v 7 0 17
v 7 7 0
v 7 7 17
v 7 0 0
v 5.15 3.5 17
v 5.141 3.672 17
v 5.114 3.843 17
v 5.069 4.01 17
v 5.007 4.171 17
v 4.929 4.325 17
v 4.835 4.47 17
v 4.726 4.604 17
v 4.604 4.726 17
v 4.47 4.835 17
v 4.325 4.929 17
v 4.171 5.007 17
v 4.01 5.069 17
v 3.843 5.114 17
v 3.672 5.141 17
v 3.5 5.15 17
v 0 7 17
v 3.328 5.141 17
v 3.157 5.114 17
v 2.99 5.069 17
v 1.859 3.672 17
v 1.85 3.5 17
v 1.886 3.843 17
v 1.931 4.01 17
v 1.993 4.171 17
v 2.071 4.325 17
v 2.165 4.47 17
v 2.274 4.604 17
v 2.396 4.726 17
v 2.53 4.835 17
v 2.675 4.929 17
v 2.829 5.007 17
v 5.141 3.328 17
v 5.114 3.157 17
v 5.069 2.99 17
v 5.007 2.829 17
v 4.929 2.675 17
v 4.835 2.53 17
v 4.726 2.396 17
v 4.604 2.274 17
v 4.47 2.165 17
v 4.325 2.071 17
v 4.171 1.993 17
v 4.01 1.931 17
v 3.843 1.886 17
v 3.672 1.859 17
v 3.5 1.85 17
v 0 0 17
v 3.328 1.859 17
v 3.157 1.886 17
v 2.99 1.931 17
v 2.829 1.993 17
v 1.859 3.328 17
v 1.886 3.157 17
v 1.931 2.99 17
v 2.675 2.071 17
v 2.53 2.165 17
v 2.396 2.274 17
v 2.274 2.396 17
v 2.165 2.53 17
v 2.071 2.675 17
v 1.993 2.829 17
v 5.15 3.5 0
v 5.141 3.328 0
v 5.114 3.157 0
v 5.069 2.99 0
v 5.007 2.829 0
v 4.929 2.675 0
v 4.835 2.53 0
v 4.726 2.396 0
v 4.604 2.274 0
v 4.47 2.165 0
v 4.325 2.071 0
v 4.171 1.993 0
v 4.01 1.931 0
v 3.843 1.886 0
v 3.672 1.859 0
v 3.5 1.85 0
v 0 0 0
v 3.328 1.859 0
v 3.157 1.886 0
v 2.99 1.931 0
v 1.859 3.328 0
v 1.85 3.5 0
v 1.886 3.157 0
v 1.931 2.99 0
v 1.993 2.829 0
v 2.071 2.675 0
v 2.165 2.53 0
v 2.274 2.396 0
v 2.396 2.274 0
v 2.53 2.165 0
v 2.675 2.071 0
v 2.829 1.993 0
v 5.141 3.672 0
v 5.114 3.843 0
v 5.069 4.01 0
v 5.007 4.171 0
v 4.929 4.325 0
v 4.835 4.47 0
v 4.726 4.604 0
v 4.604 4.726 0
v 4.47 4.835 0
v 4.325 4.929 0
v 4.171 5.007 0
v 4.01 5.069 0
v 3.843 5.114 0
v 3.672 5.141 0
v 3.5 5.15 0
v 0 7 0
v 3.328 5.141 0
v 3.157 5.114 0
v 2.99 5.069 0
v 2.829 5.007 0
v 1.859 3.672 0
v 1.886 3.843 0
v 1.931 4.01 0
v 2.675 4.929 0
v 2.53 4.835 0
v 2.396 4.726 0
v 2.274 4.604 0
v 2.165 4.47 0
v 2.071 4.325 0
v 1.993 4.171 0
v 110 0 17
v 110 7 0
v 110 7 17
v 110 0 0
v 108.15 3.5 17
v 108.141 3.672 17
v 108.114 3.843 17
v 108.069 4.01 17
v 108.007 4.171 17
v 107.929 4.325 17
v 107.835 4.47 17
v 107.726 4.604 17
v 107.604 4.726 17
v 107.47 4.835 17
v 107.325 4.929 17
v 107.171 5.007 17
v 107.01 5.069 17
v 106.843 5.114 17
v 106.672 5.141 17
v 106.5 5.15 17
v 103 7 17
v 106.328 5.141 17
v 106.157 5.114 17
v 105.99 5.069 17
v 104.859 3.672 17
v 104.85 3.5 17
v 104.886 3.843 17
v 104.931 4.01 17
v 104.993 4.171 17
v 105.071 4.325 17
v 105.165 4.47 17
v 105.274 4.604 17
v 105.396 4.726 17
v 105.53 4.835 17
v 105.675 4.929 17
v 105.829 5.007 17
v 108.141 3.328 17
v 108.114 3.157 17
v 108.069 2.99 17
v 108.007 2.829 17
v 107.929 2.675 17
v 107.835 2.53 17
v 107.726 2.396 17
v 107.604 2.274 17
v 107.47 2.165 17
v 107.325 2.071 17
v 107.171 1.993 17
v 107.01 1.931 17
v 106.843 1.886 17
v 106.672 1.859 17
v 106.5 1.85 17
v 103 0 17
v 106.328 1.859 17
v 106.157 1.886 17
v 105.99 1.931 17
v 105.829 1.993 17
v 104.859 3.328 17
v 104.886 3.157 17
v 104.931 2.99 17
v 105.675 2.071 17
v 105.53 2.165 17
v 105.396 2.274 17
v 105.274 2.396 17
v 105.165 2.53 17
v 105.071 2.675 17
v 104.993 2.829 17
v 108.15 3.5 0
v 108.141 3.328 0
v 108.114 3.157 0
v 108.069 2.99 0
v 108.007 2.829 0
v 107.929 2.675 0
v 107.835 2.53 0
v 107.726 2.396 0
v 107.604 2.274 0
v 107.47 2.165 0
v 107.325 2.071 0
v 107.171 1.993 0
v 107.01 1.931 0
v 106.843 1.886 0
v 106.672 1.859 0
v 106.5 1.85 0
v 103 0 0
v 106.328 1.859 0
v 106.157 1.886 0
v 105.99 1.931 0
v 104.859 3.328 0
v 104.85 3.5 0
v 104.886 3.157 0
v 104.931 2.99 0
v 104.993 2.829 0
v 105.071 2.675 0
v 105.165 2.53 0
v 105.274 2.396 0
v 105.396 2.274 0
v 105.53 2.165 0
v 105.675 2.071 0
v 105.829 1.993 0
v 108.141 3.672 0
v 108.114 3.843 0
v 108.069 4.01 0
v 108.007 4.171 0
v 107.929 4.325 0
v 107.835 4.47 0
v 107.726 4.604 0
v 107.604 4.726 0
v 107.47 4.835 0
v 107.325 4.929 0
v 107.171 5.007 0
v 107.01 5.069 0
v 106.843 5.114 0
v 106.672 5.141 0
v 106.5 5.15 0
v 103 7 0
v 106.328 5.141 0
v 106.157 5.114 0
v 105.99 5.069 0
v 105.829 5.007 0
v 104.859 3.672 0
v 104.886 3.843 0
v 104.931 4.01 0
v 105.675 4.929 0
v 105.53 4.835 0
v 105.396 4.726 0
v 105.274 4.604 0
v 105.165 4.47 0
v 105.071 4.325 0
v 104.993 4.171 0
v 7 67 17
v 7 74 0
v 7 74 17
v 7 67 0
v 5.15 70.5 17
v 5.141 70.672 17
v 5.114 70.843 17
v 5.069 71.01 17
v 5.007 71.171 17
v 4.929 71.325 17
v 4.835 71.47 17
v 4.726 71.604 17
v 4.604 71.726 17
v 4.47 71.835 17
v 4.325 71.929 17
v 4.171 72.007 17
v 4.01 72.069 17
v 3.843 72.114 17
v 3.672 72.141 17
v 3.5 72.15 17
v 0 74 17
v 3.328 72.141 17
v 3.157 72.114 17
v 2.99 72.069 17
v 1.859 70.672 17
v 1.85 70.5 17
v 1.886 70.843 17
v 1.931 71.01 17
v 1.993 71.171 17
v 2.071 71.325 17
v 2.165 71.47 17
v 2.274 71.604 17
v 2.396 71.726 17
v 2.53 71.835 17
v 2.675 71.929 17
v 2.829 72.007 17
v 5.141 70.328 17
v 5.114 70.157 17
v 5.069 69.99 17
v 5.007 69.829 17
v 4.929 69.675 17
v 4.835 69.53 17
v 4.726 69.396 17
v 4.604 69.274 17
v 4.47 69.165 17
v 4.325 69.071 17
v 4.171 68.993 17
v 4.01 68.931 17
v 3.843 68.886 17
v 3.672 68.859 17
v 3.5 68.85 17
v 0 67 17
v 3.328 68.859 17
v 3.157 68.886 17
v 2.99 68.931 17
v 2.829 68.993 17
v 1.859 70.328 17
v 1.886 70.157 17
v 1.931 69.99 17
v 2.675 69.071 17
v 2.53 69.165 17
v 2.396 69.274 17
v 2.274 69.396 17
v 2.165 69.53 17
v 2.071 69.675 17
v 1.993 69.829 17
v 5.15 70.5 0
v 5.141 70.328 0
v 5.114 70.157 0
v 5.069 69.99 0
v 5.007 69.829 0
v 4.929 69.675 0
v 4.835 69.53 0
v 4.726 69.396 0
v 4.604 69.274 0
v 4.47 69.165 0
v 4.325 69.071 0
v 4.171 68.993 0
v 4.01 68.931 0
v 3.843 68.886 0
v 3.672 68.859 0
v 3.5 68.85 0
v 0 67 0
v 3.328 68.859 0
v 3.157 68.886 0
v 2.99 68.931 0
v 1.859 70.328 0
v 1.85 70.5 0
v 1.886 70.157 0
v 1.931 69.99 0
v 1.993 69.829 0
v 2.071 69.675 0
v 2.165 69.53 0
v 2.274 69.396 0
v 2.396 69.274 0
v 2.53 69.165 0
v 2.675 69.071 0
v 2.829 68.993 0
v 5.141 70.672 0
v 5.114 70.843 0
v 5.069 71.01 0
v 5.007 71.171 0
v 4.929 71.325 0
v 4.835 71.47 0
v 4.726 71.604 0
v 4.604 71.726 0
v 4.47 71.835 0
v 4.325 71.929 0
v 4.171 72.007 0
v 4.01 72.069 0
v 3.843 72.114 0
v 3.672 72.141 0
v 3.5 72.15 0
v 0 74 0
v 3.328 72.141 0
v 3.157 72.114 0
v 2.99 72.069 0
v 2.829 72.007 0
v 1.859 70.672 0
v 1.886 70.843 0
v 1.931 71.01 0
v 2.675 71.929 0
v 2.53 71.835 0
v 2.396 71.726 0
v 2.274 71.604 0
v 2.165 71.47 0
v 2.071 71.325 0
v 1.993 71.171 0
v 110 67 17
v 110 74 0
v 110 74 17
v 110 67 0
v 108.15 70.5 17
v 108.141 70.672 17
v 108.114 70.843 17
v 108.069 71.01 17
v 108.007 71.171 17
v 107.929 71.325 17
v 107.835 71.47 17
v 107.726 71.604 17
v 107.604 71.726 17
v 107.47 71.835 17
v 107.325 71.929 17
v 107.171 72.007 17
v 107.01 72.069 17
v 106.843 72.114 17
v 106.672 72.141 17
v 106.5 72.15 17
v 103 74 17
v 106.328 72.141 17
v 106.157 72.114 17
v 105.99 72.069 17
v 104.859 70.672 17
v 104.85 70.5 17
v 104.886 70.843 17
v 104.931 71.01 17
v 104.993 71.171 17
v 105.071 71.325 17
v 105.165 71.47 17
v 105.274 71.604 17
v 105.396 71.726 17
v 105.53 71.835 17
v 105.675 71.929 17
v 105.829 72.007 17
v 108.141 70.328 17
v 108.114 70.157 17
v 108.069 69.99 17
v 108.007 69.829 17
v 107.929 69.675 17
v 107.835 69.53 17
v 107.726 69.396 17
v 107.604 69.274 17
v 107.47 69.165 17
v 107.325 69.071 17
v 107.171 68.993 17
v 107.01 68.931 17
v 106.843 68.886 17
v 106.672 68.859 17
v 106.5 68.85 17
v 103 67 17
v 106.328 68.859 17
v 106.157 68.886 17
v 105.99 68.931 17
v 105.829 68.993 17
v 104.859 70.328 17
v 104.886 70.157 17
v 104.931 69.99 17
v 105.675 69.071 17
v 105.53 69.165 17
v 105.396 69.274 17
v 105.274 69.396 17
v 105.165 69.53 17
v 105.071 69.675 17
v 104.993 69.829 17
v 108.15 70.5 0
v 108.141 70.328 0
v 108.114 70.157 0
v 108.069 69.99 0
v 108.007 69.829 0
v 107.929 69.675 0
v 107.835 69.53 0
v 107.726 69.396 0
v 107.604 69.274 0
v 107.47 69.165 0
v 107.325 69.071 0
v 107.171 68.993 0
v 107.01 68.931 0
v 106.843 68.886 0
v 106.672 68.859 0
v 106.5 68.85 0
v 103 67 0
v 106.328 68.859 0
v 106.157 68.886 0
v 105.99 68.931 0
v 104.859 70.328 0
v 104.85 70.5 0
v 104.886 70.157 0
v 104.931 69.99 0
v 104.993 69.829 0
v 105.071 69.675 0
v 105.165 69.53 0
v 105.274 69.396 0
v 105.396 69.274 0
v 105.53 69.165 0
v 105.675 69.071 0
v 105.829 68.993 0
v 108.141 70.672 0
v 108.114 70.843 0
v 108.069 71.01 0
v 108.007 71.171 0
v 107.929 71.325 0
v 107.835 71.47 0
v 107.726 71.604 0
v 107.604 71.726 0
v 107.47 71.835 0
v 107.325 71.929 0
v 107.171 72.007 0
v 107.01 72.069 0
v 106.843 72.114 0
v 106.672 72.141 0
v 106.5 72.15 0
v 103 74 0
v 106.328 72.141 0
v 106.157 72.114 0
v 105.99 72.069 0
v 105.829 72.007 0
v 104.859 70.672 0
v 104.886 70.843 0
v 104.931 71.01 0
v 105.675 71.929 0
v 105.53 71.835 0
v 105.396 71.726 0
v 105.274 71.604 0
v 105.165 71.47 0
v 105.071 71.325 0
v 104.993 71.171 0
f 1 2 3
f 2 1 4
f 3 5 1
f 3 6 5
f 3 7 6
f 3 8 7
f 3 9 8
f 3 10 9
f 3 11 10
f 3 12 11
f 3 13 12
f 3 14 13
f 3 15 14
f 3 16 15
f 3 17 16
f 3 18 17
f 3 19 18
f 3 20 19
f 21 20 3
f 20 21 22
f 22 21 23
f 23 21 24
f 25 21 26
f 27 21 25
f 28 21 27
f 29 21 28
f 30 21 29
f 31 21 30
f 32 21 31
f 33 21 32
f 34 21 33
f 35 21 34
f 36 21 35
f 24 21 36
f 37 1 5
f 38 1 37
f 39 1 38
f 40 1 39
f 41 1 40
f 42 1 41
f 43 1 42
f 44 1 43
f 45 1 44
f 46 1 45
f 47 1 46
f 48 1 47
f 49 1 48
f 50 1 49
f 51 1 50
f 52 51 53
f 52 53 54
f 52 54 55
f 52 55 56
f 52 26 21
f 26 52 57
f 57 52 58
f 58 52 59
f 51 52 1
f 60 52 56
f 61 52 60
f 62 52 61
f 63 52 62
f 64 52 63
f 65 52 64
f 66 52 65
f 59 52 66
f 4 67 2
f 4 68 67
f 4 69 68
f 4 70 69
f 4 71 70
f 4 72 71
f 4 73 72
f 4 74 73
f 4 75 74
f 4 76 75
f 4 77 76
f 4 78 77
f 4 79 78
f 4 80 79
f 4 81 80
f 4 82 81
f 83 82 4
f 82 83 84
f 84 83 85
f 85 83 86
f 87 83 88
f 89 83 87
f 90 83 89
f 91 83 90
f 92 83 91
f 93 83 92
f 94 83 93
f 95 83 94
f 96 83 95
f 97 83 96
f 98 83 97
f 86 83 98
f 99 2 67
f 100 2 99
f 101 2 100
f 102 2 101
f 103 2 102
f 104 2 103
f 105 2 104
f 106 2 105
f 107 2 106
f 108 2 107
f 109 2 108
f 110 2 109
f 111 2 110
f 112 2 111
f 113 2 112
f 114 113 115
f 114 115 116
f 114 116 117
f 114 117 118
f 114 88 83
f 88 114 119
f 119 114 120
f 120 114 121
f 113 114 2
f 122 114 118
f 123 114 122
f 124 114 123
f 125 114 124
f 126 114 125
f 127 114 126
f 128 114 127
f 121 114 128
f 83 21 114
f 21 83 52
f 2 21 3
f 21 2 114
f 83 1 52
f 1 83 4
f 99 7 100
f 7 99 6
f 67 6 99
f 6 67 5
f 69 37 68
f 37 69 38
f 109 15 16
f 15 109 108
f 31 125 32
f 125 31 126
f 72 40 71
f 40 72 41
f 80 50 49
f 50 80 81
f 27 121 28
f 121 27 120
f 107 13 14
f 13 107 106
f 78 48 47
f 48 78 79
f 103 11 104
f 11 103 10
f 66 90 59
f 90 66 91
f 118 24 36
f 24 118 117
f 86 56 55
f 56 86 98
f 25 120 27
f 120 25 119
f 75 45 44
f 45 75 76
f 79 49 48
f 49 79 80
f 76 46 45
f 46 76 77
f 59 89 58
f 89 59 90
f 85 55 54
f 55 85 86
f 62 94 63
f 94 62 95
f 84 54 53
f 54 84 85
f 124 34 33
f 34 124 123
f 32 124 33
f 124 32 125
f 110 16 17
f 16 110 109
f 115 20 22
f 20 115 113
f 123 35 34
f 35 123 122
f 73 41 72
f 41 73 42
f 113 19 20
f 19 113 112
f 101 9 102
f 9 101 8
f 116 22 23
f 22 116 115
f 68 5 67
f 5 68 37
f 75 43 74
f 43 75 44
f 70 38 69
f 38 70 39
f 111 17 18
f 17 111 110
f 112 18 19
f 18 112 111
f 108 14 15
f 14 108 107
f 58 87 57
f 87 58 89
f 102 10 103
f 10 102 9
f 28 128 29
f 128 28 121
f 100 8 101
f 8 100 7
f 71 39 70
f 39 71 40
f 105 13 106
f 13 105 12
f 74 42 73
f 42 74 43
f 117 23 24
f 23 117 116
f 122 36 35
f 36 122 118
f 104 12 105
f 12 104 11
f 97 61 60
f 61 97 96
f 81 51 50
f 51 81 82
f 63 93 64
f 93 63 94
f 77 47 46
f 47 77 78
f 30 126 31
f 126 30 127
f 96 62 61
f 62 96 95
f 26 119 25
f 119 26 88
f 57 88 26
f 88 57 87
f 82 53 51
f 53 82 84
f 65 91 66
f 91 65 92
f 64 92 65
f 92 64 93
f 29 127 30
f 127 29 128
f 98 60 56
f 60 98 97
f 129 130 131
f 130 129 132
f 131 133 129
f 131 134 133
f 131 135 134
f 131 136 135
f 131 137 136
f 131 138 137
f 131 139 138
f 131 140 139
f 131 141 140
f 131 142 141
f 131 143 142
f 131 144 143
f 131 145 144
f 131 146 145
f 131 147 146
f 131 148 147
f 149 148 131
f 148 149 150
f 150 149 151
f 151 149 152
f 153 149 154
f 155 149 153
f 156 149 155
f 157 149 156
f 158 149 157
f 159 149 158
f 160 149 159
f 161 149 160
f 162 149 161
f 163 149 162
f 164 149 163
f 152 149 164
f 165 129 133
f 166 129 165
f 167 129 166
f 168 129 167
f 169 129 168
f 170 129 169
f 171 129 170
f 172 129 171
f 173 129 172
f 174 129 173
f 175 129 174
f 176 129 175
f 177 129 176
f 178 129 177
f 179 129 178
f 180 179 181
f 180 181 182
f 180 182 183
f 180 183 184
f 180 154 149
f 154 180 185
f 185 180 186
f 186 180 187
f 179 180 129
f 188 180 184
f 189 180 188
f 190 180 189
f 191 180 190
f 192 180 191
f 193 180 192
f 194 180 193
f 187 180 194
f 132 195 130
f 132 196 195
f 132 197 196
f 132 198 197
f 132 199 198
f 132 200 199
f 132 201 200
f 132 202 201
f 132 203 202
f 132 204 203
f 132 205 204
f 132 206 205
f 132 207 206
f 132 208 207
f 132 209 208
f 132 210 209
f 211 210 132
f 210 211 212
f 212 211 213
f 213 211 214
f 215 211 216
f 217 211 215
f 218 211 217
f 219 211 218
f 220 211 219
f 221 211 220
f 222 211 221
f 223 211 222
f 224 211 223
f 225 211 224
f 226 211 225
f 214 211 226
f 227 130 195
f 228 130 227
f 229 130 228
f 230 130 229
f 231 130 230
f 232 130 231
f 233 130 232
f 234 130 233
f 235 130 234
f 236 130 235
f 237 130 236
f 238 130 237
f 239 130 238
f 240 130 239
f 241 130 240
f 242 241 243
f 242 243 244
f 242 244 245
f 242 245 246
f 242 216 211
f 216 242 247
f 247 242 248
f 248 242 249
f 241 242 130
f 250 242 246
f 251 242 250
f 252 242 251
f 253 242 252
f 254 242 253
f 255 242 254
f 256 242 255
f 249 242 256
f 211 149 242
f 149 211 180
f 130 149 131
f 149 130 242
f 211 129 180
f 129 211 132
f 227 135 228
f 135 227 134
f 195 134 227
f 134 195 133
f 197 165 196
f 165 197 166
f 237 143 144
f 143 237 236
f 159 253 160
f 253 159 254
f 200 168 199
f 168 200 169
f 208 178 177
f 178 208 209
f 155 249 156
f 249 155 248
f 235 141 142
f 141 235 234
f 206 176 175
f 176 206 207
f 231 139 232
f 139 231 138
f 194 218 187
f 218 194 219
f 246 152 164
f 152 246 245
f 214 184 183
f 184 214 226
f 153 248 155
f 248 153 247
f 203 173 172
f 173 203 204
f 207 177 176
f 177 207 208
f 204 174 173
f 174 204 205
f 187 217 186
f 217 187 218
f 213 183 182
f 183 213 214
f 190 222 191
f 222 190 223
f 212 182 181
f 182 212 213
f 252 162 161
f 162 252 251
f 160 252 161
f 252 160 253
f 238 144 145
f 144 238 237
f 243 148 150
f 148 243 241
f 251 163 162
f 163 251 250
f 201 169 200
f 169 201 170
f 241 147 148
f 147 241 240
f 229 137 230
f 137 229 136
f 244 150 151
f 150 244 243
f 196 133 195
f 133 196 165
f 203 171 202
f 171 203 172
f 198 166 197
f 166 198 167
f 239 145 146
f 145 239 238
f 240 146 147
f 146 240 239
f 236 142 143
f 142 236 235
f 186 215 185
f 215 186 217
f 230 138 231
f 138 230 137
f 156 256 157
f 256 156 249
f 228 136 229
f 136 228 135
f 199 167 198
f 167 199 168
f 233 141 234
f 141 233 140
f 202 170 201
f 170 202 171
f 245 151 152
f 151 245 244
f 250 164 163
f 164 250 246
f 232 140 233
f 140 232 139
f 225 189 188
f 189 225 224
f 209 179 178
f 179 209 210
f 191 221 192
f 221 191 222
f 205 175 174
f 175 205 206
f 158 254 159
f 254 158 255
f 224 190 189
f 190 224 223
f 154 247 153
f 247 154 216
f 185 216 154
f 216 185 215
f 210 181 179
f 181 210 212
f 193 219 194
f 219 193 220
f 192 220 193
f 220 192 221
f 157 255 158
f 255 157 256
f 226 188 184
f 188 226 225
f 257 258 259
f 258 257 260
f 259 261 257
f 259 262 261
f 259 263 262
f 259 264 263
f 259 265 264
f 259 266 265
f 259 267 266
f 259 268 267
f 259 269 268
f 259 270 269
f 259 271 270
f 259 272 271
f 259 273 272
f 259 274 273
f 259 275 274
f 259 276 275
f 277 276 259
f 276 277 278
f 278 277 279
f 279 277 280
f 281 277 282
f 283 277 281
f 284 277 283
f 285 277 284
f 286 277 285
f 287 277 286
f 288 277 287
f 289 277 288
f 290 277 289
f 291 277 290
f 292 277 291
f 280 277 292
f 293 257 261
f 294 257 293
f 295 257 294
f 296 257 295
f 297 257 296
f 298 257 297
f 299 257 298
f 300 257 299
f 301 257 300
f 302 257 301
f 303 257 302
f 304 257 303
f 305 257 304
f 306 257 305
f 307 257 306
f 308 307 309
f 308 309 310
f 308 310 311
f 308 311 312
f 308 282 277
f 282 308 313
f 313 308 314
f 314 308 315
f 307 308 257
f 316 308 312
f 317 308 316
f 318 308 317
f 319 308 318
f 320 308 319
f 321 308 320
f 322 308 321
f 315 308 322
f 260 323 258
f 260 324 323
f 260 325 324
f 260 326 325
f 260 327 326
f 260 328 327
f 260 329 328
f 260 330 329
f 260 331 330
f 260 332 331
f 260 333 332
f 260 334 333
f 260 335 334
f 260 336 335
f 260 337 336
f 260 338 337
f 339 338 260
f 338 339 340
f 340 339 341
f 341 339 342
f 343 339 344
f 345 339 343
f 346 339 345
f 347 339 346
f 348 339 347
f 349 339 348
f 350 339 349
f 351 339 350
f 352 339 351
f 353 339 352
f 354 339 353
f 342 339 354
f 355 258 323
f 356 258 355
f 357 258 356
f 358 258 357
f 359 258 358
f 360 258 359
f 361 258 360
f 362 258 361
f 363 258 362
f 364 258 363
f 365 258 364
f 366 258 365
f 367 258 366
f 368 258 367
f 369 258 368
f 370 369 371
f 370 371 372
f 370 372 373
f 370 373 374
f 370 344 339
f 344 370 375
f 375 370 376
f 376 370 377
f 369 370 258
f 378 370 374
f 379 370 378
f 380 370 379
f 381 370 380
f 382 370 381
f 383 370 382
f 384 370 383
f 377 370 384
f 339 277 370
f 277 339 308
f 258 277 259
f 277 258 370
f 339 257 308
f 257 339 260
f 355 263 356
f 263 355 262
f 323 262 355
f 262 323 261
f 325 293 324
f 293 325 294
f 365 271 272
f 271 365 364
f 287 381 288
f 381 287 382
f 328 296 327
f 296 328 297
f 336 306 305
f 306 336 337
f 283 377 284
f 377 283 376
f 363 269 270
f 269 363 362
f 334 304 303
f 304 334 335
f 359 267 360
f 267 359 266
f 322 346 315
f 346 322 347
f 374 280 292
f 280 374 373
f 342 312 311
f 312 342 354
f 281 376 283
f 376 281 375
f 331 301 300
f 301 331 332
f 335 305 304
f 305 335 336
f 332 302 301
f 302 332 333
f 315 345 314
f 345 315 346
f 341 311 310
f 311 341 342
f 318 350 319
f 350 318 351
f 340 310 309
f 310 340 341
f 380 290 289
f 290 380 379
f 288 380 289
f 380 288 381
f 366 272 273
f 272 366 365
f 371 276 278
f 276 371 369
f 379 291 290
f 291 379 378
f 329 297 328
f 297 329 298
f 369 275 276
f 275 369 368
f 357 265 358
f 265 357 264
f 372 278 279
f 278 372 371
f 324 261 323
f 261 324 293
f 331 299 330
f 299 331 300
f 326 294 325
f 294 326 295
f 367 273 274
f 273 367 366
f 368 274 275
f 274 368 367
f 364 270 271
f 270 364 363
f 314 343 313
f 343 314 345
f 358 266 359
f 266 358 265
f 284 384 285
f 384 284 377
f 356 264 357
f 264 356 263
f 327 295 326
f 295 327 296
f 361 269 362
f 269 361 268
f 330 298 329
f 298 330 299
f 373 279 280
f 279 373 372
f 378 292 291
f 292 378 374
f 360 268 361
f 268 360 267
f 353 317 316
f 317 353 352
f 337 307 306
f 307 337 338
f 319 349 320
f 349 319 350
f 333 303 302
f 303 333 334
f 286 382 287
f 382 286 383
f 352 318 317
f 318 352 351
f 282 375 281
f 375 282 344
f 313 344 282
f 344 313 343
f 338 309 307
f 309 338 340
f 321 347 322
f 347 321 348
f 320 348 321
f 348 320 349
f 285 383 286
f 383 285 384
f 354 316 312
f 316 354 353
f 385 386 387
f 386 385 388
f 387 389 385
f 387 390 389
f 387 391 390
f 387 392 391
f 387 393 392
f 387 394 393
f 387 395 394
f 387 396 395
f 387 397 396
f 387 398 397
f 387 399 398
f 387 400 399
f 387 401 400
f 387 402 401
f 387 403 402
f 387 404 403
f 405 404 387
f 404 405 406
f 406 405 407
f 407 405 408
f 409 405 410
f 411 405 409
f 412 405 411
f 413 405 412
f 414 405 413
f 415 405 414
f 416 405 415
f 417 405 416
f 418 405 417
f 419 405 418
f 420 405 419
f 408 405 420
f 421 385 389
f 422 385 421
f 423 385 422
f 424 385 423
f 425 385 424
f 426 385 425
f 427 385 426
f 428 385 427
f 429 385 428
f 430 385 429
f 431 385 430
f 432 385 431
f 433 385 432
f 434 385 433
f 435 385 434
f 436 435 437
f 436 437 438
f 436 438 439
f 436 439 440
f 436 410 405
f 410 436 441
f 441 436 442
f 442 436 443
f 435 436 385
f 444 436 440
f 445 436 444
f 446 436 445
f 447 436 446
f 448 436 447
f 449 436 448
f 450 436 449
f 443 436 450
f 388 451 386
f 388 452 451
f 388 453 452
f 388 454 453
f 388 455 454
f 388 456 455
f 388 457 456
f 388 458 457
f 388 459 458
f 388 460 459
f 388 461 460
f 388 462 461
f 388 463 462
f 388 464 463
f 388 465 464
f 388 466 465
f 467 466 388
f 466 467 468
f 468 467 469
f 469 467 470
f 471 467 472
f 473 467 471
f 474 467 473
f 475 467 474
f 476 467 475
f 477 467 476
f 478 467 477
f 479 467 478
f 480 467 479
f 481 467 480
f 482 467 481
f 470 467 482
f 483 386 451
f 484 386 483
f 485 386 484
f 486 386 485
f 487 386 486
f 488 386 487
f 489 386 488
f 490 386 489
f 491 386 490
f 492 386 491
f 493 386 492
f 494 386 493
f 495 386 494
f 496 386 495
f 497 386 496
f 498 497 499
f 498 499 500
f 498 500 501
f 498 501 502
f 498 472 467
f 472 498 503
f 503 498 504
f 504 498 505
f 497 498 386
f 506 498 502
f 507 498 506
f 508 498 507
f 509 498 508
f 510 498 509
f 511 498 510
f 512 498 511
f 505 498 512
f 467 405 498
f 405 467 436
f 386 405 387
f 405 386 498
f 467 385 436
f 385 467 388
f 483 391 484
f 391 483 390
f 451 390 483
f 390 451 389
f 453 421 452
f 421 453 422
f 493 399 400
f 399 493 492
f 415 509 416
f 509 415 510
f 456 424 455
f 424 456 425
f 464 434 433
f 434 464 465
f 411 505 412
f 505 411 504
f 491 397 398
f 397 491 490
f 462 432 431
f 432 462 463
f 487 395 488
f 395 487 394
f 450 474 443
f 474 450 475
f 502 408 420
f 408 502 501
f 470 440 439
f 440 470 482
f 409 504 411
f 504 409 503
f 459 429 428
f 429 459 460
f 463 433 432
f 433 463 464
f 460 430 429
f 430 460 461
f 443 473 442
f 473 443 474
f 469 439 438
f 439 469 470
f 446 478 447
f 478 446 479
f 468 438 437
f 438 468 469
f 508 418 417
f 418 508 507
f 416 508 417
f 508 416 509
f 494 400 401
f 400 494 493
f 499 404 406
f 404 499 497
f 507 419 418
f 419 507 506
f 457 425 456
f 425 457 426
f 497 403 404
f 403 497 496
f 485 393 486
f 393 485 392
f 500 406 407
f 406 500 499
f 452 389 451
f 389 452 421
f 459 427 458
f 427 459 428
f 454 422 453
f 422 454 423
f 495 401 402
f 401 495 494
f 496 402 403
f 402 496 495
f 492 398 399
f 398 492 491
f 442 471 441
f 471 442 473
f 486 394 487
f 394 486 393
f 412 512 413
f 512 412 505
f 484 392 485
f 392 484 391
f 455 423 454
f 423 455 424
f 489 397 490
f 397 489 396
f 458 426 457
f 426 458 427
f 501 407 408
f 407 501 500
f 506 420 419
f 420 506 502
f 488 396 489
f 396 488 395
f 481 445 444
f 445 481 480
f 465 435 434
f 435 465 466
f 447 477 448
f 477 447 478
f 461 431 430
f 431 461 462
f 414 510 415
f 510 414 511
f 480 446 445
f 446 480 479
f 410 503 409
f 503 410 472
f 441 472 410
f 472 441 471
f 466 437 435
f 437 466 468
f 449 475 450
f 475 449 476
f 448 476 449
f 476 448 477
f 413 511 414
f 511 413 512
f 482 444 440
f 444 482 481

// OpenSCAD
// file: ../../00_common/screw_bosses.scad
// =============================================================================
// OpenMotorBridge - Screw Bosses & Fastener Primitives
// =============================================================================
// File: hardware/cad/scad/00_common/screw_bosses.scad
// Description: Reusable parametric modules for screw standoffs, corner clamping
//              posts, and mounting ears.
// =============================================================================

include <parameters.scad>;

// 1. Cylindrical Screw Standoff Boss (with center hole)
module screw_boss(outer_r=2.5, inner_r=1.2, h=5.0) {
    difference() {
        cylinder(r=outer_r, h=h, center=false);
        translate([0, 0, -0.1])
            cylinder(r=inner_r, h=h + 0.2, center=false);
    }
}

// 2. Rectangular Corner Clamping Post (with center screw hole)
module corner_screw_post(size_x=5.0, size_y=5.0, h=12.0, hole_r=1.65, hole_h=10.0, hole_offset_z=2.0) {
    difference() {
        cube(size=[size_x, size_y, h], center=false);
        translate([size_x/2.0, size_y/2.0, hole_offset_z])
            cylinder(r=hole_r, h=hole_h + 0.1, center=false);
    }
}

// 3. M4 Silentblock Outer Mounting Ear (Centered in Y around y=0, extends along +X)
module mounting_ear_m4(ear_len=14.0, ear_w=12.0, ear_h=5.0, hole_r=2.2) {
    difference() {
        union() {
            translate([0, -ear_w/2.0, 0])
                cube(size=[ear_len - ear_w/2.0, ear_w, ear_h], center=false);
            translate([ear_len - ear_w/2.0, 0, 0])
                cylinder(r=ear_w/2.0, h=ear_h, center=false);
        }
        translate([ear_len - ear_w/2.0, 0, -0.1])
            cylinder(r=hole_r, h=ear_h + 0.2, center=false);
    }
}

// 4. Captive Hex Nut Pocket (DIN 934 / DIN 985 with center screw through-hole)
module hex_nut_pocket(sw=NUT_M4_SW, h=NUT_M4_H, screw_r=M4_SCREW_HOLE_R, through_h=10.0) {
    // Hexagonal pocket (flat-to-flat SW converted to circle radius: r = sw / sqrt(3))
    hex_r = sw / sqrt(3);
    union() {
        // Hexagonal nut pocket
        cylinder(r=hex_r, h=h, center=false, $fn=6);
        // Screw clearance through-hole
        translate([0, 0, -through_h/2.0])
            cylinder(r=screw_r, h=through_h + h, center=false, $fn=30);
    }
}
// file: ../../00_common/parameters.scad
// =============================================================================
// OpenMotorBridge - Global CAD Parameters & Settings
// =============================================================================
// File: hardware/cad/scad/00_common/parameters.scad
// Description: Global dimensional constants, manufacturing clearances and
//              circle resolution ($fn) for all OpenSCAD modules.
// =============================================================================

// --- 1. Circle & Curve Resolution ---
$fn = 60; // Smooth cylinders and holes for high-quality MJF 3D printing

// --- 2. Central Main Box Dimensions (3-Tier Sandwich) ---
MAIN_BOX_OUTER_L      = 110.0; // Outer length in X (mm)
MAIN_BOX_OUTER_W      = 74.0;  // Outer width in Y (mm)
MAIN_BOX_LOWER_H      = 17.0;  // Lower case height in Z (mm)
MAIN_BOX_MID_H        = 15.0;  // Mid tray height in Z (mm)
MAIN_BOX_LID_H        = 4.0;   // Lid plate thickness in Z (mm)
MAIN_BOX_WALL         = 2.5;   // Nominal wall thickness (mm)
MAIN_BOX_CORNER_POST  = 7.0;   // Corner clamping screw post size (mm, for M3 hex nut pockets)

// --- 3. Satellite Pod Dimensions (Universal Enlarged Envelope) ---

POD_OUTER_W           = 70.0;  // Outer width in Y (mm)
POD_OUTER_H           = 38.0;  // Outer height in Z (mm)
POD_WALL              = 3.5;   // Nominal wall thickness (mm)
POD_BULKHEAD_X        = 18.0;  // Partition bulkhead position in X (mm)
POD_CHAMBER_L         = 117.0; // Sliding chamber length in X (mm)
POD_CHAMBER_W         = 63.0;  // Sliding chamber width in Y (mm)
POD_CHAMBER_H         = 31.0;  // Sliding chamber height in Z (mm)

// --- 4. Pod Linear Guide Rails (Poka-Yoke Tongue & Groove) ---
POD_GROOVE_W          = 3.0;   // Internal guide groove width in Z (mm)
POD_GROOVE_DEPTH      = 1.5;   // Internal guide groove depth in Y (mm)
POD_GROOVE_LEFT_Z     = 10.0;  // Center height of left groove (mm)
POD_GROOVE_RIGHT_Z    = 18.0;  // Center height of right groove (mm, asym offset)

CARTRIDGE_TONGUE_W    = 2.6;   // Cartridge tongue rail height in Z (mm, 0.2mm clearance)
CARTRIDGE_TONGUE_PROT = 1.4;   // Cartridge tongue protrusion in Y (mm, 0.1mm clearance)
CARTRIDGE_CHAMFER_L   = 4.0;   // 30° lead-in chamfer nose length (mm)

// --- 5. Cartridge Dimensions (Enlarged Universal Sled) ---
CARTRIDGE_BASE_L      = 116.0; // Sled length in X (mm)
CARTRIDGE_BASE_W      = 58.0;  // Sled width in Y (mm)
CARTRIDGE_BASE_H      = 28.0;  // Sled height in Z (mm)
CARTRIDGE_FACE_L      = 4.0;   // Front faceplate thickness in X (mm)
CARTRIDGE_FACE_W      = 64.0;  // Front faceplate width in Y (mm)
CARTRIDGE_FACE_H      = 34.0;  // Front faceplate height in Z (mm)

// --- 5a. RF Interface & Sealing Dimensions ---
SMA_BORE_R            = 3.25;  // Ø 6.5 mm through-hole for standard SMA bulkhead
SMA_ORECESS_R         = 4.75;  // Ø 9.5 mm recess for waterproof silicone O-ring
SMA_ORECESS_DEPTH     = 1.2;   // 1.2 mm deep O-ring compression pocket

// --- 5b. Magnetic Anti-Theft Lock System ---
LATCH_PIVOT_X         = 58.0;  // Center pivot position along sled X (mm)
LATCH_MAGNET_X        = 46.0;  // Ferromagnetic anchor position along sled X (mm)
LATCH_TOOTH_X         = 70.0;  // Locking sawtooth pawl position along sled X (mm)
LATCH_ARM_H           = 6.0;   // Rocker lever height in Z (mm)
LATCH_ARM_THICK       = 2.6;   // Rocker beam thickness in Y (mm)
LATCH_MAGNET_PIN_DIA  = 6.2;   // Bore for Ø 6.0 mm steel dowel pin (mm)
LATCH_SPRING_DIA      = 3.8;   // Bore for Ø 3.5 mm return compression spring (mm)

// --- 6. Standard Captive Hex Nut Pockets (DIN 934 / DIN 985 with +0.2 mm MJF/FDM clearance) ---
NUT_M2_SW             = 4.2;   // M2 across flats (nominal 4.0 mm)
NUT_M2_H              = 1.8;   // M2 thickness (nominal 1.6 mm)
NUT_M2_5_SW           = 5.2;   // M2.5 across flats (nominal 5.0 mm)
NUT_M2_5_H            = 2.2;   // M2.5 thickness (nominal 2.0 mm)
NUT_M3_SW             = 5.7;   // M3 across flats (nominal 5.5 mm)
NUT_M3_H              = 2.6;   // M3 thickness (nominal 2.4 mm)
NUT_M4_SW             = 7.2;   // M4 across flats (nominal 7.0 mm)
NUT_M4_H              = 3.4;   // M4 thickness (nominal 3.2 mm)
NUT_M5_SW             = 8.2;   // M5 across flats (nominal 8.0 mm)
NUT_M5_H              = 4.2;   // M5 thickness (nominal 4.0 mm)

// Direct Plastic Thread-Forming / Self-Tapping Pilot Holes in PA12 (100% Soldering-Iron Free)
M2_PILOT_HOLE_R       = 0.85;  // Core hole for M2 screws in PA12 (Ø 1.7 mm)
M2_5_PILOT_HOLE_R     = 1.05;  // Core hole for M2.5 screws in PA12 (Ø 2.1 mm)
M3_PILOT_HOLE_R       = 1.25;  // Core hole for M3 screws in PA12 (Ø 2.5 mm)

// --- 7. Screw & Clearance Dimensions ---
M2_SCREW_HOLE_R       = 1.1;   // M2 clearance hole (r = 1.1 mm -> Ø 2.2 mm)
M2_5_SCREW_HOLE_R     = 1.4;   // M2.5 clearance hole (r = 1.4 mm -> Ø 2.8 mm)
M3_SCREW_HOLE_R       = 1.65;  // M3 clearance hole (r = 1.65 mm -> Ø 3.3 mm)
M4_SCREW_HOLE_R       = 2.2;   // M4 clearance hole (r = 2.2 mm -> Ø 4.4 mm)
M8_BORE_R             = 4.0;   // M8 cable through-bore (r = 4.0 mm -> Ø 8.0 mm)
M8_STUDS_OUTER_R      = 6.0;   // M8 neck outer radius (Ø 12.0 mm)

// --- 8. Universal Front Node Enclosure Dimensions (Type E: 98 x 68 x 25 mm) ---
FRONT_NODE_PCB_L      = 82.0;  // PCB length in X (mm, PCBA 05)
FRONT_NODE_PCB_W      = 50.0;  // PCB width in Y (mm, PCBA 05)
FRONT_NODE_PCB_H      = 1.6;   // PCB thickness in Z (mm)
FRONT_NODE_PCB_R      = 2.5;   // PCB corner radius (mm)

FRONT_NODE_CHAMBER_L  = 86.0;  // Internal chamber length in X (mm, 2mm margin per side)
FRONT_NODE_CHAMBER_W  = 56.0;  // Internal chamber width in Y (mm, 3mm margin per side)
FRONT_NODE_TUB_H      = 17.5;  // Lower tub depth in Z (mm)
FRONT_NODE_LID_H      = 7.5;   // Upper lid height in Z (mm)
FRONT_NODE_WALL       = 2.5;   // Wall thickness in HP MJF PA12 (mm)
FRONT_NODE_CORNER_R   = 4.0;   // Outer enclosure corner radius (mm)

FRONT_NODE_OUTER_L    = FRONT_NODE_CHAMBER_L + 2 * FRONT_NODE_WALL + 7.0; // 98.0 mm
FRONT_NODE_OUTER_W    = FRONT_NODE_CHAMBER_W + 2 * FRONT_NODE_WALL + 7.0; // 68.0 mm
FRONT_NODE_OUTER_H    = FRONT_NODE_TUB_H + FRONT_NODE_LID_H;              // 25.0 mm

// PCB Standoff Heights & Radii (100% Soldering-Iron Free)
FRONT_NODE_STANDOFF_H = 3.0;   // Height of PCB standoffs from floor (mm)
FRONT_NODE_STANDOFF_R = 3.0;   // Outer radius of M2.5 screw bosses (mm)
FRONT_NODE_CORE_HOLE_R= M2_5_PILOT_HOLE_R; // Core hole for direct M2.5 screw engagement (Ø 2.1 mm)

// AMPS 4-Hole Mounting Pattern (38 x 30 mm with DIN 934 M4 Captive Nut Pockets)
AMPS_SPACING_X        = 38.0;  // AMPS hole distance in X (mm)
AMPS_SPACING_Y        = 30.0;  // AMPS hole distance in Y (mm)
AMPS_NUT_SW           = NUT_M4_SW; // Captive M4 hex nut pocket across flats (7.2 mm)
AMPS_NUT_H            = NUT_M4_H;  // Captive M4 hex nut pocket depth (3.4 mm)

// Acoustic Vent for Knowles SPH0645 MEMS
FRONT_NODE_MIC_HOLE_R = 1.25;  // Sound canal radius (Ø 2.5 mm)
FRONT_NODE_MIC_MEMB_R = 3.0;   // Gore ePTFE membrane pocket radius (Ø 6.0 mm)
FRONT_NODE_MIC_MEMB_D = 0.8;   // Membrane pocket depth (mm)
// main file
// =============================================================================
// OpenMotorBridge - Main Box: Corner Clamping Posts (4x M3 Eck-Spannsäulen)
// =============================================================================
// File: hardware/cad/scad/01_main_box/parts/001_lower_screws_enclosure.scad
// =============================================================================

include <../../00_common/parameters.scad>;
include <../../00_common/screw_bosses.scad>;

module main_box_corner_posts(length=110.0, width=74.0, height=17.0, post_size=MAIN_BOX_CORNER_POST, hole_r=M3_SCREW_HOLE_R) {
    // 1. Bottom-Left Corner [0, 0]
    translate([0, 0, 0])
        corner_screw_post(size_x=post_size, size_y=post_size, h=height, hole_r=hole_r, hole_h=height, hole_offset_z=0);

    // 2. Bottom-Right Corner [length - post_size, 0]
    translate([length - post_size, 0, 0])
        corner_screw_post(size_x=post_size, size_y=post_size, h=height, hole_r=hole_r, hole_h=height, hole_offset_z=0);

    // 3. Top-Left Corner [0, width - post_size]
    translate([0, width - post_size, 0])
        corner_screw_post(size_x=post_size, size_y=post_size, h=height, hole_r=hole_r, hole_h=height, hole_offset_z=0);

    // 4. Top-Right Corner [length - post_size, width - post_size]
    translate([length - post_size, width - post_size, 0])
        corner_screw_post(size_x=post_size, size_y=post_size, h=height, hole_r=hole_r, hole_h=height, hole_offset_z=0);
}

// 5. 4x Captive DIN 934 / DIN 985 M3 Hex Nut Pockets for lower case underside (z=0)
module main_box_corner_nut_pockets(length=110.0, width=74.0, post_size=MAIN_BOX_CORNER_POST, sw=NUT_M3_SW, h=NUT_M3_H, screw_r=M3_SCREW_HOLE_R) {
    offset = post_size / 2.0;
    nut_coords = [
        [offset, offset],
        [length - offset, offset],
        [offset, width - offset],
        [length - offset, width - offset]
    ];

    for (pt = nut_coords) {
        translate([pt[0], pt[1], -0.1])
            rotate([0, 0, 30])
                hex_nut_pocket(sw=sw, h=h + 0.1, screw_r=screw_r, through_h=10.0);
    }
}

// Standalone preview
main_box_corner_posts();
